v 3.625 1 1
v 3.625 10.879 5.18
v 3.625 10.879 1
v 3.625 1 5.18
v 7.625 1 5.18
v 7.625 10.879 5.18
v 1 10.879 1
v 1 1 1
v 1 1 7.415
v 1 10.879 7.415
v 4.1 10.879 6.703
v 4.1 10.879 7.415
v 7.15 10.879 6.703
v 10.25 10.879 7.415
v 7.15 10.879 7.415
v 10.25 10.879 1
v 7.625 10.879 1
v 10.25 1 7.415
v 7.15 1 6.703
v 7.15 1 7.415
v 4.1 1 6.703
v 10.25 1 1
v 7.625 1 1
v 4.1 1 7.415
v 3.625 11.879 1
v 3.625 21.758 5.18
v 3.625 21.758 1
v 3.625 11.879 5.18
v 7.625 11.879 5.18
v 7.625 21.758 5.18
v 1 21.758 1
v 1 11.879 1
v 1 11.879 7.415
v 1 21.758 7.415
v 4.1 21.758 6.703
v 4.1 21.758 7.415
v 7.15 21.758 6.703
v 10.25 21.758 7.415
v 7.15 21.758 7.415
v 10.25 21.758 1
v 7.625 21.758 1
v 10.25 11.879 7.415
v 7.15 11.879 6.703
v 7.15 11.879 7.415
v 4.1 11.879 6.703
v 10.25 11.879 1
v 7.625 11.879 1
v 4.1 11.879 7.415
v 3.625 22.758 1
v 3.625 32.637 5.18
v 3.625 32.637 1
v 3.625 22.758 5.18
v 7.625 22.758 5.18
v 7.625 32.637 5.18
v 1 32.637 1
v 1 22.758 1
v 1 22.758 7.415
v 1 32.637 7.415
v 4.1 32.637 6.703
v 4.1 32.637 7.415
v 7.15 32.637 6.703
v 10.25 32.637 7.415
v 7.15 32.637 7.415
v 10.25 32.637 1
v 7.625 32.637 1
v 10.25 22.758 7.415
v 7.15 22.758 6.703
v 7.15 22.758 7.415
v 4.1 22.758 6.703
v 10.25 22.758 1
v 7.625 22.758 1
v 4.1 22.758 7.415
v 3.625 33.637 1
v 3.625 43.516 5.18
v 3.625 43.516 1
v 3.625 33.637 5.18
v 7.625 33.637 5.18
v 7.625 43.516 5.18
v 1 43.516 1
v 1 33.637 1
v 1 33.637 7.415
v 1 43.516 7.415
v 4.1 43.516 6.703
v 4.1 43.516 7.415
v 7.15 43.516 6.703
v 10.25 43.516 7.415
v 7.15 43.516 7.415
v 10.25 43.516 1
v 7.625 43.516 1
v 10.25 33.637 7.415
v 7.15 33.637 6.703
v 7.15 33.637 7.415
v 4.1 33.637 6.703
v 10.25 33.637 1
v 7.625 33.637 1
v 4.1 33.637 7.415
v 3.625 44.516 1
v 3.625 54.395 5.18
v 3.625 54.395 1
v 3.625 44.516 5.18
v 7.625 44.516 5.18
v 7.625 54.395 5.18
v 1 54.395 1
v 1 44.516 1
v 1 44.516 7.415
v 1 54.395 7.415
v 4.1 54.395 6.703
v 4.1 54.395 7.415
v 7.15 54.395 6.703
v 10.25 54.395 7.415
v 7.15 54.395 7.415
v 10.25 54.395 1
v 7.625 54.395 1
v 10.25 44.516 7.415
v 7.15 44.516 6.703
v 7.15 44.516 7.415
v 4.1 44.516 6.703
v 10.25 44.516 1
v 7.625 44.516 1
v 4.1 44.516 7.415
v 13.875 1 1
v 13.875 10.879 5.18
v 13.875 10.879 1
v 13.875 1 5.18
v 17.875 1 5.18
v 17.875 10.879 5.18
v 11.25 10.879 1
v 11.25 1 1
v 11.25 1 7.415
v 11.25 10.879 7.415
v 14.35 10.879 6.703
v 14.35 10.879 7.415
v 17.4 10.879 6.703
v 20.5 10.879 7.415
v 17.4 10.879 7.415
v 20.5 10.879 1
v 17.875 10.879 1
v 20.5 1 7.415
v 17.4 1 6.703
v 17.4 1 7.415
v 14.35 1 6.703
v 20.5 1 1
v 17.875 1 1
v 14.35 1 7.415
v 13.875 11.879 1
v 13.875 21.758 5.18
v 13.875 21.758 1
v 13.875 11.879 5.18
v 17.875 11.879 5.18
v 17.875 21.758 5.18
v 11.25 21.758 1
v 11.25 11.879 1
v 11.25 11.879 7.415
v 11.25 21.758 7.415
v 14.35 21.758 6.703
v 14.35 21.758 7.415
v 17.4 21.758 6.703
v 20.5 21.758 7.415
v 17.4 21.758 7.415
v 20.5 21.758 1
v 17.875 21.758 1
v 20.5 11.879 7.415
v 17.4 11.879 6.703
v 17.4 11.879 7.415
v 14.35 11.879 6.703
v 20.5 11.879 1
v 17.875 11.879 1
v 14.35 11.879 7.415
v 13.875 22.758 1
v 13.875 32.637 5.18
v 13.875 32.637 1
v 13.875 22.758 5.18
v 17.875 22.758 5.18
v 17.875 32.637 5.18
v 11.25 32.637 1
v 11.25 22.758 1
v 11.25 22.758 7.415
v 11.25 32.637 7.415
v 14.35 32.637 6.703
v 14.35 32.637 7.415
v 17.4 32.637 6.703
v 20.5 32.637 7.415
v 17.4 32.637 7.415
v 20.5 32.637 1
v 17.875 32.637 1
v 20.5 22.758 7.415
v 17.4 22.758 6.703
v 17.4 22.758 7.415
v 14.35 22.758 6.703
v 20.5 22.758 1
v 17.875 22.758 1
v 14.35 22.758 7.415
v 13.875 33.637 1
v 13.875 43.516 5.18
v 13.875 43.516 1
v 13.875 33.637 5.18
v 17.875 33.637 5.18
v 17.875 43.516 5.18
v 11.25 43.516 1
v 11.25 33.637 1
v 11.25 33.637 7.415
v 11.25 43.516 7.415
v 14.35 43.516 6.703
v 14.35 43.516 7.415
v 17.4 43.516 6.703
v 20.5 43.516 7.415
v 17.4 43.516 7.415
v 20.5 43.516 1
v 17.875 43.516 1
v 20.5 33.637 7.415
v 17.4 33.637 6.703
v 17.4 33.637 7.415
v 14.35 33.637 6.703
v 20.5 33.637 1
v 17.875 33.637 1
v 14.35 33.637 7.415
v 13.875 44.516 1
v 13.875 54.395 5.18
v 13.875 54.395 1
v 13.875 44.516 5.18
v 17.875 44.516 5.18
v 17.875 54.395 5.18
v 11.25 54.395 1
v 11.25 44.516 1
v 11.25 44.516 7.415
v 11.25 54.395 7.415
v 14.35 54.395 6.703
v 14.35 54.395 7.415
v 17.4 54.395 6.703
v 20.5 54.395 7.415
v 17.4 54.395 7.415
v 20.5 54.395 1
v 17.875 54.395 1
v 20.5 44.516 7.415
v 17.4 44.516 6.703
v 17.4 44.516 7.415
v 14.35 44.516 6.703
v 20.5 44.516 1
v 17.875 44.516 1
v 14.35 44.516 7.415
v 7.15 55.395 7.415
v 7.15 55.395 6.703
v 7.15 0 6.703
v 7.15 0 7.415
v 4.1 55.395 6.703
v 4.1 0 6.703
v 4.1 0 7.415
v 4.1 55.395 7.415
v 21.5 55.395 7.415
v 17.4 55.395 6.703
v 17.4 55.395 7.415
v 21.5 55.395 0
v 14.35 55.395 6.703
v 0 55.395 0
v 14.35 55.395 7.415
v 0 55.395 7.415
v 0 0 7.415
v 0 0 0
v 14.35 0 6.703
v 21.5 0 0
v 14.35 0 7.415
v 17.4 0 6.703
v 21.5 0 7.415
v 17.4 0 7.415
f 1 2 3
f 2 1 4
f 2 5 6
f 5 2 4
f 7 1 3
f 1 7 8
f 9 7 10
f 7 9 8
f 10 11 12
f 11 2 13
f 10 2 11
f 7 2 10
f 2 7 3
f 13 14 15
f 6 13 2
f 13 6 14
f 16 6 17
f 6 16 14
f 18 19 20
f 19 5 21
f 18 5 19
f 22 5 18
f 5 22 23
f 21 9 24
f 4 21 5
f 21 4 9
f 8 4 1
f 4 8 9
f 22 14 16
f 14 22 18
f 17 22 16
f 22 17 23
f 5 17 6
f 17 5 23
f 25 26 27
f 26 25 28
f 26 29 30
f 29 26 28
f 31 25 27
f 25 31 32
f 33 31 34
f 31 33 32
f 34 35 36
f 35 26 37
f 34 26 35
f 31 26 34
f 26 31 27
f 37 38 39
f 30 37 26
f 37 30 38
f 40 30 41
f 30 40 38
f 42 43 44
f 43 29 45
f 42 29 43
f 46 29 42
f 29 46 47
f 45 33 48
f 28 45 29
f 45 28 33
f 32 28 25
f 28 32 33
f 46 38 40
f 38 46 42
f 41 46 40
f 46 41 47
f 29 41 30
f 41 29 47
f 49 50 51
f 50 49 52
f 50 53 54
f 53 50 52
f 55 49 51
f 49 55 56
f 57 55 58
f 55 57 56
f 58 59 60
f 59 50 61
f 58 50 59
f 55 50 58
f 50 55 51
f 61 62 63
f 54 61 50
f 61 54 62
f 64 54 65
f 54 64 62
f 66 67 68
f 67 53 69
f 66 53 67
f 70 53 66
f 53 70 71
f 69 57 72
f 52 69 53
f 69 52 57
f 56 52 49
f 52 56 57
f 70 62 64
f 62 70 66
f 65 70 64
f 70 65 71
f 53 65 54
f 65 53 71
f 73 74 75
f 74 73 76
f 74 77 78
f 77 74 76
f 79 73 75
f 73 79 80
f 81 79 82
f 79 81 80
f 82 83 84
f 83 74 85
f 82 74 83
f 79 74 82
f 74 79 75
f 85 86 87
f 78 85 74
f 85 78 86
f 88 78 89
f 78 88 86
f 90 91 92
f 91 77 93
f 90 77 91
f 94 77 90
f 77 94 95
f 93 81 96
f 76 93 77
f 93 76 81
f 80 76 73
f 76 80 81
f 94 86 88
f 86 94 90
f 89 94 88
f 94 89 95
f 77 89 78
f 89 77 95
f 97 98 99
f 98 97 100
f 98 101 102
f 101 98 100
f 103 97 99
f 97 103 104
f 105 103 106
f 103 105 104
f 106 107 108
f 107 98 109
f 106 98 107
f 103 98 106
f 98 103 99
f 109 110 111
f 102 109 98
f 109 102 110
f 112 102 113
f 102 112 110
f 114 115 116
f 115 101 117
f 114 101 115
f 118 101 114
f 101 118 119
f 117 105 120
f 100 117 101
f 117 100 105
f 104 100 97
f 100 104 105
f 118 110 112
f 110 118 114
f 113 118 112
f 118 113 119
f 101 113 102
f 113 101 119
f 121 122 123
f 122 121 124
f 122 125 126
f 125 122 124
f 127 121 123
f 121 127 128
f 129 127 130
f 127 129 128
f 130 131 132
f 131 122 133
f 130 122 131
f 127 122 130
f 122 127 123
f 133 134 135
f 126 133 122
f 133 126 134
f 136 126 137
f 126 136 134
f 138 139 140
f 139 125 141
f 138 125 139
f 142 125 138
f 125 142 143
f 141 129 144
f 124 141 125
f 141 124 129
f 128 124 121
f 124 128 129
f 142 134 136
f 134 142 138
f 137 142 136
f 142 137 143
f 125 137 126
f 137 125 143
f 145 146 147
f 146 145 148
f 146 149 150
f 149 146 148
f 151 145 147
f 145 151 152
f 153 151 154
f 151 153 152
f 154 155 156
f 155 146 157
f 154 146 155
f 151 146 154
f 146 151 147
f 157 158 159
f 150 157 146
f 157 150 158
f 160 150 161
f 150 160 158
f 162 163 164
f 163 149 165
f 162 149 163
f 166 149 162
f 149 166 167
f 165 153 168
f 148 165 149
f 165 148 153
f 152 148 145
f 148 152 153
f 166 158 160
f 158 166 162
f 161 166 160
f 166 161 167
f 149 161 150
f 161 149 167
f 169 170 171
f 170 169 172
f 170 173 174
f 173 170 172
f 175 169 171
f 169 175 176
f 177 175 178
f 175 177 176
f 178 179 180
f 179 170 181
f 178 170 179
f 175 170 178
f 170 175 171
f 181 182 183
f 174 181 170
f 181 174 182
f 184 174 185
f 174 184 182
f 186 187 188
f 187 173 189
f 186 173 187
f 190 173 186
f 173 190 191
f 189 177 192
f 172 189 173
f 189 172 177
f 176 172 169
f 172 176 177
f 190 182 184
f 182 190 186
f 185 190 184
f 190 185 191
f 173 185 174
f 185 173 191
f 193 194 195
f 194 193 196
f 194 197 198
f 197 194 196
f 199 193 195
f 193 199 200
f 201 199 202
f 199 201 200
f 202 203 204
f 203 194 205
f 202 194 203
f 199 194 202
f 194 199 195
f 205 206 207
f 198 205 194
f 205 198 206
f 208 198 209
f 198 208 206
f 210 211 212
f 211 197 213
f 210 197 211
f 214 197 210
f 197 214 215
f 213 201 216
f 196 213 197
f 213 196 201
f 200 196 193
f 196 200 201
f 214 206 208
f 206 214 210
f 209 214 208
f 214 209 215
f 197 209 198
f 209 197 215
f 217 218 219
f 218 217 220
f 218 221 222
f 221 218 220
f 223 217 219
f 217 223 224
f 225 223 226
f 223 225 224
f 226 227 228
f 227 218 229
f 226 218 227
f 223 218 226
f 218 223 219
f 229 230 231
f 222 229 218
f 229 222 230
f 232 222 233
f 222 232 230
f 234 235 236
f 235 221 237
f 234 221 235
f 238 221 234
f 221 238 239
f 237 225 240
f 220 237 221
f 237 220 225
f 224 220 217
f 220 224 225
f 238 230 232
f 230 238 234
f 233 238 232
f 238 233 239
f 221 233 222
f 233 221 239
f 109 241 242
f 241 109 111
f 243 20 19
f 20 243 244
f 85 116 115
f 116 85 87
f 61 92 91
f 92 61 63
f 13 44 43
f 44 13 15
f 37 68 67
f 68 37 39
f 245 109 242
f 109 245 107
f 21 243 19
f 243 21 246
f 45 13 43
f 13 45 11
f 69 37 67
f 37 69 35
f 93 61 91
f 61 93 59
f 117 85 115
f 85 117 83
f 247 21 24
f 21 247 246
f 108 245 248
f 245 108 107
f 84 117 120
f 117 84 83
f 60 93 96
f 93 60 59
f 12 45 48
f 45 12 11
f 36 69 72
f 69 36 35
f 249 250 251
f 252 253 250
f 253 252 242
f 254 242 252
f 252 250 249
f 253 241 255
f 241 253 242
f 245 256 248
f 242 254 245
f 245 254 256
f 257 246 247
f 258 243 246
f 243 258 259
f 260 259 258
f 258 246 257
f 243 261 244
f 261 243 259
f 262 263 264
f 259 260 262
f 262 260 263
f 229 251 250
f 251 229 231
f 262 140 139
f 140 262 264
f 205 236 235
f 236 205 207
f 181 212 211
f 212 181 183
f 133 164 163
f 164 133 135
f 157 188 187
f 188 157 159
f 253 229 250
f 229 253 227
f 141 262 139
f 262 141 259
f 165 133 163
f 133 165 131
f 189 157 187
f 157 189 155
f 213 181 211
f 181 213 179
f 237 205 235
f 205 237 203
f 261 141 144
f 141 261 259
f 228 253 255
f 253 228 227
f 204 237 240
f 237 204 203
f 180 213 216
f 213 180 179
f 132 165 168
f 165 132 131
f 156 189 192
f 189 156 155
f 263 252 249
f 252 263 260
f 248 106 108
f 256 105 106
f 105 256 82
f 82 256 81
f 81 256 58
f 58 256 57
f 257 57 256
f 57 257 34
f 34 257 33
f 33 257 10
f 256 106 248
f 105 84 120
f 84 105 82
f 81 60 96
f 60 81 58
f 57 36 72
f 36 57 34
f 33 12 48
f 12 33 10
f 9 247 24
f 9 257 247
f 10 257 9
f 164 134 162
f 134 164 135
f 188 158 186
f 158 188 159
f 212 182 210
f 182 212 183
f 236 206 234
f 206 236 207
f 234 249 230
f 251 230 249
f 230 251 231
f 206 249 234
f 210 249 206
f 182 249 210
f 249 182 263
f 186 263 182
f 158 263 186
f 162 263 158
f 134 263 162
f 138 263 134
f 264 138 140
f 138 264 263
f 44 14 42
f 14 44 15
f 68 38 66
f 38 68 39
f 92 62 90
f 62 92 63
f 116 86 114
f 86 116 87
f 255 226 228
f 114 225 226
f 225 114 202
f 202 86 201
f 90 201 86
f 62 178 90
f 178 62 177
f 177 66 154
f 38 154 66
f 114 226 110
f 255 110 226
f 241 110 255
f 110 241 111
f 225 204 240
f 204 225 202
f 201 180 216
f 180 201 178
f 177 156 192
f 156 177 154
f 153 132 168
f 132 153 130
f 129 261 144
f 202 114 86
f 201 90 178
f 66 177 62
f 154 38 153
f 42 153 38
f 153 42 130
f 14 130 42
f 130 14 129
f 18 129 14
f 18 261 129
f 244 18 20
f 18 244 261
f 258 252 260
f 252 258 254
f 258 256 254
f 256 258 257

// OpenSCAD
// How many pins do you have in your IC?
DIP_pin_number = 8; // [4, 6, 8, 14, 16, 18, 20]
// Check the last pin in rows. For shorter ICs sometimes it's just a half pin compare to the others. Choose full pin if it's looks like the others.
Ending_pins = "half_pin"; // [half_pin,full_pin]
Number_of_rows = 2; // [1:10]
ICs_in_a_row = 5; // [1:10]
// Width of walls and bottom plate
Wall_width = 1; // [0.6:0.2:2]
// Build up full height base block, or save some filament
Do_full_height = false;

module hidden_vars() {}
// Dip size
// http://ww1.microchip.com/downloads/en/PackagingSpec/00049w.pdf
pins_in_row = DIP_pin_number / 2;
p = 2.54; // Pitch
d = (pins_in_row + (Ending_pins == "half_pin" ? -.15 : .65)) * p; // Overall length
// e1 = 6.73; // Ceramic Pkg. Width
e1 = 4;
eb = 9.15; // Overall Row Spacing
a = 4.57; // Top to Seating Plane
a1 = 0.77; // Standoff
a2 = a - a1; // Resin block height
l = 4.13; // Tip to Seating Plane
dip_offset = 0.05; // Extra space around DIP package in each dimension for keep it loosy
dip_width = eb + 2 * dip_offset; // Overall width
dip_length = d + 2 * dip_offset; // Overall length
dip_height = a + l + 2 * dip_offset; // Overall height

// The DIP package itself
module dip() {
    cube([
        (eb - e1) / 2 + dip_offset,
        d + 2 * dip_offset,
        l + dip_offset
    ]); // Leg row 1
    translate([0, 0, l + dip_offset]) cube([
        eb + 2 * dip_offset,
        d + 2 * dip_offset,
        a + dip_offset
    ]); // Resin block
    translate([(eb - e1) / 2 + e1 + dip_offset, 0, 0]) cube([
        (eb - e1) / 2 + dip_offset,
        d + 2 * dip_offset,
        l + dip_offset
    ]); // Leg row 2
}

// Array of ICs
module dip_matrix() {
    for (x = [1:Number_of_rows]) {
        for (y = [1:ICs_in_a_row]) {
            translate([
                (x - 1) * (dip_width + Wall_width) + Wall_width,
                (y - 1) * (dip_length + Wall_width) + Wall_width,
                Wall_width
            ]) dip();
        }
    }
}

// Base block
module block() {
    cube([
        Number_of_rows * (dip_width + Wall_width) + Wall_width,
        ICs_in_a_row * (dip_length + Wall_width) + Wall_width,
        Do_full_height ? dip_height + Wall_width : l + a / 2 + Wall_width
    ]);
}

// Space for helping get off the IC
module screw_holes() {
    for (x = [1:Number_of_rows]) {
        translate([
                (x - 1) * (dip_width + Wall_width) + Wall_width + (eb - e1 + dip_offset) / 2 + e1 / 8,
                0,
                Wall_width + l + a * 1 / 3 + dip_offset
            ]) cube([
                e1 * 3 / 4  + dip_offset,
                ICs_in_a_row * (dip_length + Wall_width) + Wall_width,
                a * 2 / 3 + dip_offset
            ]);
    }
}

// The design itself
difference() {
    block();
    dip_matrix();
    screw_holes();
}
